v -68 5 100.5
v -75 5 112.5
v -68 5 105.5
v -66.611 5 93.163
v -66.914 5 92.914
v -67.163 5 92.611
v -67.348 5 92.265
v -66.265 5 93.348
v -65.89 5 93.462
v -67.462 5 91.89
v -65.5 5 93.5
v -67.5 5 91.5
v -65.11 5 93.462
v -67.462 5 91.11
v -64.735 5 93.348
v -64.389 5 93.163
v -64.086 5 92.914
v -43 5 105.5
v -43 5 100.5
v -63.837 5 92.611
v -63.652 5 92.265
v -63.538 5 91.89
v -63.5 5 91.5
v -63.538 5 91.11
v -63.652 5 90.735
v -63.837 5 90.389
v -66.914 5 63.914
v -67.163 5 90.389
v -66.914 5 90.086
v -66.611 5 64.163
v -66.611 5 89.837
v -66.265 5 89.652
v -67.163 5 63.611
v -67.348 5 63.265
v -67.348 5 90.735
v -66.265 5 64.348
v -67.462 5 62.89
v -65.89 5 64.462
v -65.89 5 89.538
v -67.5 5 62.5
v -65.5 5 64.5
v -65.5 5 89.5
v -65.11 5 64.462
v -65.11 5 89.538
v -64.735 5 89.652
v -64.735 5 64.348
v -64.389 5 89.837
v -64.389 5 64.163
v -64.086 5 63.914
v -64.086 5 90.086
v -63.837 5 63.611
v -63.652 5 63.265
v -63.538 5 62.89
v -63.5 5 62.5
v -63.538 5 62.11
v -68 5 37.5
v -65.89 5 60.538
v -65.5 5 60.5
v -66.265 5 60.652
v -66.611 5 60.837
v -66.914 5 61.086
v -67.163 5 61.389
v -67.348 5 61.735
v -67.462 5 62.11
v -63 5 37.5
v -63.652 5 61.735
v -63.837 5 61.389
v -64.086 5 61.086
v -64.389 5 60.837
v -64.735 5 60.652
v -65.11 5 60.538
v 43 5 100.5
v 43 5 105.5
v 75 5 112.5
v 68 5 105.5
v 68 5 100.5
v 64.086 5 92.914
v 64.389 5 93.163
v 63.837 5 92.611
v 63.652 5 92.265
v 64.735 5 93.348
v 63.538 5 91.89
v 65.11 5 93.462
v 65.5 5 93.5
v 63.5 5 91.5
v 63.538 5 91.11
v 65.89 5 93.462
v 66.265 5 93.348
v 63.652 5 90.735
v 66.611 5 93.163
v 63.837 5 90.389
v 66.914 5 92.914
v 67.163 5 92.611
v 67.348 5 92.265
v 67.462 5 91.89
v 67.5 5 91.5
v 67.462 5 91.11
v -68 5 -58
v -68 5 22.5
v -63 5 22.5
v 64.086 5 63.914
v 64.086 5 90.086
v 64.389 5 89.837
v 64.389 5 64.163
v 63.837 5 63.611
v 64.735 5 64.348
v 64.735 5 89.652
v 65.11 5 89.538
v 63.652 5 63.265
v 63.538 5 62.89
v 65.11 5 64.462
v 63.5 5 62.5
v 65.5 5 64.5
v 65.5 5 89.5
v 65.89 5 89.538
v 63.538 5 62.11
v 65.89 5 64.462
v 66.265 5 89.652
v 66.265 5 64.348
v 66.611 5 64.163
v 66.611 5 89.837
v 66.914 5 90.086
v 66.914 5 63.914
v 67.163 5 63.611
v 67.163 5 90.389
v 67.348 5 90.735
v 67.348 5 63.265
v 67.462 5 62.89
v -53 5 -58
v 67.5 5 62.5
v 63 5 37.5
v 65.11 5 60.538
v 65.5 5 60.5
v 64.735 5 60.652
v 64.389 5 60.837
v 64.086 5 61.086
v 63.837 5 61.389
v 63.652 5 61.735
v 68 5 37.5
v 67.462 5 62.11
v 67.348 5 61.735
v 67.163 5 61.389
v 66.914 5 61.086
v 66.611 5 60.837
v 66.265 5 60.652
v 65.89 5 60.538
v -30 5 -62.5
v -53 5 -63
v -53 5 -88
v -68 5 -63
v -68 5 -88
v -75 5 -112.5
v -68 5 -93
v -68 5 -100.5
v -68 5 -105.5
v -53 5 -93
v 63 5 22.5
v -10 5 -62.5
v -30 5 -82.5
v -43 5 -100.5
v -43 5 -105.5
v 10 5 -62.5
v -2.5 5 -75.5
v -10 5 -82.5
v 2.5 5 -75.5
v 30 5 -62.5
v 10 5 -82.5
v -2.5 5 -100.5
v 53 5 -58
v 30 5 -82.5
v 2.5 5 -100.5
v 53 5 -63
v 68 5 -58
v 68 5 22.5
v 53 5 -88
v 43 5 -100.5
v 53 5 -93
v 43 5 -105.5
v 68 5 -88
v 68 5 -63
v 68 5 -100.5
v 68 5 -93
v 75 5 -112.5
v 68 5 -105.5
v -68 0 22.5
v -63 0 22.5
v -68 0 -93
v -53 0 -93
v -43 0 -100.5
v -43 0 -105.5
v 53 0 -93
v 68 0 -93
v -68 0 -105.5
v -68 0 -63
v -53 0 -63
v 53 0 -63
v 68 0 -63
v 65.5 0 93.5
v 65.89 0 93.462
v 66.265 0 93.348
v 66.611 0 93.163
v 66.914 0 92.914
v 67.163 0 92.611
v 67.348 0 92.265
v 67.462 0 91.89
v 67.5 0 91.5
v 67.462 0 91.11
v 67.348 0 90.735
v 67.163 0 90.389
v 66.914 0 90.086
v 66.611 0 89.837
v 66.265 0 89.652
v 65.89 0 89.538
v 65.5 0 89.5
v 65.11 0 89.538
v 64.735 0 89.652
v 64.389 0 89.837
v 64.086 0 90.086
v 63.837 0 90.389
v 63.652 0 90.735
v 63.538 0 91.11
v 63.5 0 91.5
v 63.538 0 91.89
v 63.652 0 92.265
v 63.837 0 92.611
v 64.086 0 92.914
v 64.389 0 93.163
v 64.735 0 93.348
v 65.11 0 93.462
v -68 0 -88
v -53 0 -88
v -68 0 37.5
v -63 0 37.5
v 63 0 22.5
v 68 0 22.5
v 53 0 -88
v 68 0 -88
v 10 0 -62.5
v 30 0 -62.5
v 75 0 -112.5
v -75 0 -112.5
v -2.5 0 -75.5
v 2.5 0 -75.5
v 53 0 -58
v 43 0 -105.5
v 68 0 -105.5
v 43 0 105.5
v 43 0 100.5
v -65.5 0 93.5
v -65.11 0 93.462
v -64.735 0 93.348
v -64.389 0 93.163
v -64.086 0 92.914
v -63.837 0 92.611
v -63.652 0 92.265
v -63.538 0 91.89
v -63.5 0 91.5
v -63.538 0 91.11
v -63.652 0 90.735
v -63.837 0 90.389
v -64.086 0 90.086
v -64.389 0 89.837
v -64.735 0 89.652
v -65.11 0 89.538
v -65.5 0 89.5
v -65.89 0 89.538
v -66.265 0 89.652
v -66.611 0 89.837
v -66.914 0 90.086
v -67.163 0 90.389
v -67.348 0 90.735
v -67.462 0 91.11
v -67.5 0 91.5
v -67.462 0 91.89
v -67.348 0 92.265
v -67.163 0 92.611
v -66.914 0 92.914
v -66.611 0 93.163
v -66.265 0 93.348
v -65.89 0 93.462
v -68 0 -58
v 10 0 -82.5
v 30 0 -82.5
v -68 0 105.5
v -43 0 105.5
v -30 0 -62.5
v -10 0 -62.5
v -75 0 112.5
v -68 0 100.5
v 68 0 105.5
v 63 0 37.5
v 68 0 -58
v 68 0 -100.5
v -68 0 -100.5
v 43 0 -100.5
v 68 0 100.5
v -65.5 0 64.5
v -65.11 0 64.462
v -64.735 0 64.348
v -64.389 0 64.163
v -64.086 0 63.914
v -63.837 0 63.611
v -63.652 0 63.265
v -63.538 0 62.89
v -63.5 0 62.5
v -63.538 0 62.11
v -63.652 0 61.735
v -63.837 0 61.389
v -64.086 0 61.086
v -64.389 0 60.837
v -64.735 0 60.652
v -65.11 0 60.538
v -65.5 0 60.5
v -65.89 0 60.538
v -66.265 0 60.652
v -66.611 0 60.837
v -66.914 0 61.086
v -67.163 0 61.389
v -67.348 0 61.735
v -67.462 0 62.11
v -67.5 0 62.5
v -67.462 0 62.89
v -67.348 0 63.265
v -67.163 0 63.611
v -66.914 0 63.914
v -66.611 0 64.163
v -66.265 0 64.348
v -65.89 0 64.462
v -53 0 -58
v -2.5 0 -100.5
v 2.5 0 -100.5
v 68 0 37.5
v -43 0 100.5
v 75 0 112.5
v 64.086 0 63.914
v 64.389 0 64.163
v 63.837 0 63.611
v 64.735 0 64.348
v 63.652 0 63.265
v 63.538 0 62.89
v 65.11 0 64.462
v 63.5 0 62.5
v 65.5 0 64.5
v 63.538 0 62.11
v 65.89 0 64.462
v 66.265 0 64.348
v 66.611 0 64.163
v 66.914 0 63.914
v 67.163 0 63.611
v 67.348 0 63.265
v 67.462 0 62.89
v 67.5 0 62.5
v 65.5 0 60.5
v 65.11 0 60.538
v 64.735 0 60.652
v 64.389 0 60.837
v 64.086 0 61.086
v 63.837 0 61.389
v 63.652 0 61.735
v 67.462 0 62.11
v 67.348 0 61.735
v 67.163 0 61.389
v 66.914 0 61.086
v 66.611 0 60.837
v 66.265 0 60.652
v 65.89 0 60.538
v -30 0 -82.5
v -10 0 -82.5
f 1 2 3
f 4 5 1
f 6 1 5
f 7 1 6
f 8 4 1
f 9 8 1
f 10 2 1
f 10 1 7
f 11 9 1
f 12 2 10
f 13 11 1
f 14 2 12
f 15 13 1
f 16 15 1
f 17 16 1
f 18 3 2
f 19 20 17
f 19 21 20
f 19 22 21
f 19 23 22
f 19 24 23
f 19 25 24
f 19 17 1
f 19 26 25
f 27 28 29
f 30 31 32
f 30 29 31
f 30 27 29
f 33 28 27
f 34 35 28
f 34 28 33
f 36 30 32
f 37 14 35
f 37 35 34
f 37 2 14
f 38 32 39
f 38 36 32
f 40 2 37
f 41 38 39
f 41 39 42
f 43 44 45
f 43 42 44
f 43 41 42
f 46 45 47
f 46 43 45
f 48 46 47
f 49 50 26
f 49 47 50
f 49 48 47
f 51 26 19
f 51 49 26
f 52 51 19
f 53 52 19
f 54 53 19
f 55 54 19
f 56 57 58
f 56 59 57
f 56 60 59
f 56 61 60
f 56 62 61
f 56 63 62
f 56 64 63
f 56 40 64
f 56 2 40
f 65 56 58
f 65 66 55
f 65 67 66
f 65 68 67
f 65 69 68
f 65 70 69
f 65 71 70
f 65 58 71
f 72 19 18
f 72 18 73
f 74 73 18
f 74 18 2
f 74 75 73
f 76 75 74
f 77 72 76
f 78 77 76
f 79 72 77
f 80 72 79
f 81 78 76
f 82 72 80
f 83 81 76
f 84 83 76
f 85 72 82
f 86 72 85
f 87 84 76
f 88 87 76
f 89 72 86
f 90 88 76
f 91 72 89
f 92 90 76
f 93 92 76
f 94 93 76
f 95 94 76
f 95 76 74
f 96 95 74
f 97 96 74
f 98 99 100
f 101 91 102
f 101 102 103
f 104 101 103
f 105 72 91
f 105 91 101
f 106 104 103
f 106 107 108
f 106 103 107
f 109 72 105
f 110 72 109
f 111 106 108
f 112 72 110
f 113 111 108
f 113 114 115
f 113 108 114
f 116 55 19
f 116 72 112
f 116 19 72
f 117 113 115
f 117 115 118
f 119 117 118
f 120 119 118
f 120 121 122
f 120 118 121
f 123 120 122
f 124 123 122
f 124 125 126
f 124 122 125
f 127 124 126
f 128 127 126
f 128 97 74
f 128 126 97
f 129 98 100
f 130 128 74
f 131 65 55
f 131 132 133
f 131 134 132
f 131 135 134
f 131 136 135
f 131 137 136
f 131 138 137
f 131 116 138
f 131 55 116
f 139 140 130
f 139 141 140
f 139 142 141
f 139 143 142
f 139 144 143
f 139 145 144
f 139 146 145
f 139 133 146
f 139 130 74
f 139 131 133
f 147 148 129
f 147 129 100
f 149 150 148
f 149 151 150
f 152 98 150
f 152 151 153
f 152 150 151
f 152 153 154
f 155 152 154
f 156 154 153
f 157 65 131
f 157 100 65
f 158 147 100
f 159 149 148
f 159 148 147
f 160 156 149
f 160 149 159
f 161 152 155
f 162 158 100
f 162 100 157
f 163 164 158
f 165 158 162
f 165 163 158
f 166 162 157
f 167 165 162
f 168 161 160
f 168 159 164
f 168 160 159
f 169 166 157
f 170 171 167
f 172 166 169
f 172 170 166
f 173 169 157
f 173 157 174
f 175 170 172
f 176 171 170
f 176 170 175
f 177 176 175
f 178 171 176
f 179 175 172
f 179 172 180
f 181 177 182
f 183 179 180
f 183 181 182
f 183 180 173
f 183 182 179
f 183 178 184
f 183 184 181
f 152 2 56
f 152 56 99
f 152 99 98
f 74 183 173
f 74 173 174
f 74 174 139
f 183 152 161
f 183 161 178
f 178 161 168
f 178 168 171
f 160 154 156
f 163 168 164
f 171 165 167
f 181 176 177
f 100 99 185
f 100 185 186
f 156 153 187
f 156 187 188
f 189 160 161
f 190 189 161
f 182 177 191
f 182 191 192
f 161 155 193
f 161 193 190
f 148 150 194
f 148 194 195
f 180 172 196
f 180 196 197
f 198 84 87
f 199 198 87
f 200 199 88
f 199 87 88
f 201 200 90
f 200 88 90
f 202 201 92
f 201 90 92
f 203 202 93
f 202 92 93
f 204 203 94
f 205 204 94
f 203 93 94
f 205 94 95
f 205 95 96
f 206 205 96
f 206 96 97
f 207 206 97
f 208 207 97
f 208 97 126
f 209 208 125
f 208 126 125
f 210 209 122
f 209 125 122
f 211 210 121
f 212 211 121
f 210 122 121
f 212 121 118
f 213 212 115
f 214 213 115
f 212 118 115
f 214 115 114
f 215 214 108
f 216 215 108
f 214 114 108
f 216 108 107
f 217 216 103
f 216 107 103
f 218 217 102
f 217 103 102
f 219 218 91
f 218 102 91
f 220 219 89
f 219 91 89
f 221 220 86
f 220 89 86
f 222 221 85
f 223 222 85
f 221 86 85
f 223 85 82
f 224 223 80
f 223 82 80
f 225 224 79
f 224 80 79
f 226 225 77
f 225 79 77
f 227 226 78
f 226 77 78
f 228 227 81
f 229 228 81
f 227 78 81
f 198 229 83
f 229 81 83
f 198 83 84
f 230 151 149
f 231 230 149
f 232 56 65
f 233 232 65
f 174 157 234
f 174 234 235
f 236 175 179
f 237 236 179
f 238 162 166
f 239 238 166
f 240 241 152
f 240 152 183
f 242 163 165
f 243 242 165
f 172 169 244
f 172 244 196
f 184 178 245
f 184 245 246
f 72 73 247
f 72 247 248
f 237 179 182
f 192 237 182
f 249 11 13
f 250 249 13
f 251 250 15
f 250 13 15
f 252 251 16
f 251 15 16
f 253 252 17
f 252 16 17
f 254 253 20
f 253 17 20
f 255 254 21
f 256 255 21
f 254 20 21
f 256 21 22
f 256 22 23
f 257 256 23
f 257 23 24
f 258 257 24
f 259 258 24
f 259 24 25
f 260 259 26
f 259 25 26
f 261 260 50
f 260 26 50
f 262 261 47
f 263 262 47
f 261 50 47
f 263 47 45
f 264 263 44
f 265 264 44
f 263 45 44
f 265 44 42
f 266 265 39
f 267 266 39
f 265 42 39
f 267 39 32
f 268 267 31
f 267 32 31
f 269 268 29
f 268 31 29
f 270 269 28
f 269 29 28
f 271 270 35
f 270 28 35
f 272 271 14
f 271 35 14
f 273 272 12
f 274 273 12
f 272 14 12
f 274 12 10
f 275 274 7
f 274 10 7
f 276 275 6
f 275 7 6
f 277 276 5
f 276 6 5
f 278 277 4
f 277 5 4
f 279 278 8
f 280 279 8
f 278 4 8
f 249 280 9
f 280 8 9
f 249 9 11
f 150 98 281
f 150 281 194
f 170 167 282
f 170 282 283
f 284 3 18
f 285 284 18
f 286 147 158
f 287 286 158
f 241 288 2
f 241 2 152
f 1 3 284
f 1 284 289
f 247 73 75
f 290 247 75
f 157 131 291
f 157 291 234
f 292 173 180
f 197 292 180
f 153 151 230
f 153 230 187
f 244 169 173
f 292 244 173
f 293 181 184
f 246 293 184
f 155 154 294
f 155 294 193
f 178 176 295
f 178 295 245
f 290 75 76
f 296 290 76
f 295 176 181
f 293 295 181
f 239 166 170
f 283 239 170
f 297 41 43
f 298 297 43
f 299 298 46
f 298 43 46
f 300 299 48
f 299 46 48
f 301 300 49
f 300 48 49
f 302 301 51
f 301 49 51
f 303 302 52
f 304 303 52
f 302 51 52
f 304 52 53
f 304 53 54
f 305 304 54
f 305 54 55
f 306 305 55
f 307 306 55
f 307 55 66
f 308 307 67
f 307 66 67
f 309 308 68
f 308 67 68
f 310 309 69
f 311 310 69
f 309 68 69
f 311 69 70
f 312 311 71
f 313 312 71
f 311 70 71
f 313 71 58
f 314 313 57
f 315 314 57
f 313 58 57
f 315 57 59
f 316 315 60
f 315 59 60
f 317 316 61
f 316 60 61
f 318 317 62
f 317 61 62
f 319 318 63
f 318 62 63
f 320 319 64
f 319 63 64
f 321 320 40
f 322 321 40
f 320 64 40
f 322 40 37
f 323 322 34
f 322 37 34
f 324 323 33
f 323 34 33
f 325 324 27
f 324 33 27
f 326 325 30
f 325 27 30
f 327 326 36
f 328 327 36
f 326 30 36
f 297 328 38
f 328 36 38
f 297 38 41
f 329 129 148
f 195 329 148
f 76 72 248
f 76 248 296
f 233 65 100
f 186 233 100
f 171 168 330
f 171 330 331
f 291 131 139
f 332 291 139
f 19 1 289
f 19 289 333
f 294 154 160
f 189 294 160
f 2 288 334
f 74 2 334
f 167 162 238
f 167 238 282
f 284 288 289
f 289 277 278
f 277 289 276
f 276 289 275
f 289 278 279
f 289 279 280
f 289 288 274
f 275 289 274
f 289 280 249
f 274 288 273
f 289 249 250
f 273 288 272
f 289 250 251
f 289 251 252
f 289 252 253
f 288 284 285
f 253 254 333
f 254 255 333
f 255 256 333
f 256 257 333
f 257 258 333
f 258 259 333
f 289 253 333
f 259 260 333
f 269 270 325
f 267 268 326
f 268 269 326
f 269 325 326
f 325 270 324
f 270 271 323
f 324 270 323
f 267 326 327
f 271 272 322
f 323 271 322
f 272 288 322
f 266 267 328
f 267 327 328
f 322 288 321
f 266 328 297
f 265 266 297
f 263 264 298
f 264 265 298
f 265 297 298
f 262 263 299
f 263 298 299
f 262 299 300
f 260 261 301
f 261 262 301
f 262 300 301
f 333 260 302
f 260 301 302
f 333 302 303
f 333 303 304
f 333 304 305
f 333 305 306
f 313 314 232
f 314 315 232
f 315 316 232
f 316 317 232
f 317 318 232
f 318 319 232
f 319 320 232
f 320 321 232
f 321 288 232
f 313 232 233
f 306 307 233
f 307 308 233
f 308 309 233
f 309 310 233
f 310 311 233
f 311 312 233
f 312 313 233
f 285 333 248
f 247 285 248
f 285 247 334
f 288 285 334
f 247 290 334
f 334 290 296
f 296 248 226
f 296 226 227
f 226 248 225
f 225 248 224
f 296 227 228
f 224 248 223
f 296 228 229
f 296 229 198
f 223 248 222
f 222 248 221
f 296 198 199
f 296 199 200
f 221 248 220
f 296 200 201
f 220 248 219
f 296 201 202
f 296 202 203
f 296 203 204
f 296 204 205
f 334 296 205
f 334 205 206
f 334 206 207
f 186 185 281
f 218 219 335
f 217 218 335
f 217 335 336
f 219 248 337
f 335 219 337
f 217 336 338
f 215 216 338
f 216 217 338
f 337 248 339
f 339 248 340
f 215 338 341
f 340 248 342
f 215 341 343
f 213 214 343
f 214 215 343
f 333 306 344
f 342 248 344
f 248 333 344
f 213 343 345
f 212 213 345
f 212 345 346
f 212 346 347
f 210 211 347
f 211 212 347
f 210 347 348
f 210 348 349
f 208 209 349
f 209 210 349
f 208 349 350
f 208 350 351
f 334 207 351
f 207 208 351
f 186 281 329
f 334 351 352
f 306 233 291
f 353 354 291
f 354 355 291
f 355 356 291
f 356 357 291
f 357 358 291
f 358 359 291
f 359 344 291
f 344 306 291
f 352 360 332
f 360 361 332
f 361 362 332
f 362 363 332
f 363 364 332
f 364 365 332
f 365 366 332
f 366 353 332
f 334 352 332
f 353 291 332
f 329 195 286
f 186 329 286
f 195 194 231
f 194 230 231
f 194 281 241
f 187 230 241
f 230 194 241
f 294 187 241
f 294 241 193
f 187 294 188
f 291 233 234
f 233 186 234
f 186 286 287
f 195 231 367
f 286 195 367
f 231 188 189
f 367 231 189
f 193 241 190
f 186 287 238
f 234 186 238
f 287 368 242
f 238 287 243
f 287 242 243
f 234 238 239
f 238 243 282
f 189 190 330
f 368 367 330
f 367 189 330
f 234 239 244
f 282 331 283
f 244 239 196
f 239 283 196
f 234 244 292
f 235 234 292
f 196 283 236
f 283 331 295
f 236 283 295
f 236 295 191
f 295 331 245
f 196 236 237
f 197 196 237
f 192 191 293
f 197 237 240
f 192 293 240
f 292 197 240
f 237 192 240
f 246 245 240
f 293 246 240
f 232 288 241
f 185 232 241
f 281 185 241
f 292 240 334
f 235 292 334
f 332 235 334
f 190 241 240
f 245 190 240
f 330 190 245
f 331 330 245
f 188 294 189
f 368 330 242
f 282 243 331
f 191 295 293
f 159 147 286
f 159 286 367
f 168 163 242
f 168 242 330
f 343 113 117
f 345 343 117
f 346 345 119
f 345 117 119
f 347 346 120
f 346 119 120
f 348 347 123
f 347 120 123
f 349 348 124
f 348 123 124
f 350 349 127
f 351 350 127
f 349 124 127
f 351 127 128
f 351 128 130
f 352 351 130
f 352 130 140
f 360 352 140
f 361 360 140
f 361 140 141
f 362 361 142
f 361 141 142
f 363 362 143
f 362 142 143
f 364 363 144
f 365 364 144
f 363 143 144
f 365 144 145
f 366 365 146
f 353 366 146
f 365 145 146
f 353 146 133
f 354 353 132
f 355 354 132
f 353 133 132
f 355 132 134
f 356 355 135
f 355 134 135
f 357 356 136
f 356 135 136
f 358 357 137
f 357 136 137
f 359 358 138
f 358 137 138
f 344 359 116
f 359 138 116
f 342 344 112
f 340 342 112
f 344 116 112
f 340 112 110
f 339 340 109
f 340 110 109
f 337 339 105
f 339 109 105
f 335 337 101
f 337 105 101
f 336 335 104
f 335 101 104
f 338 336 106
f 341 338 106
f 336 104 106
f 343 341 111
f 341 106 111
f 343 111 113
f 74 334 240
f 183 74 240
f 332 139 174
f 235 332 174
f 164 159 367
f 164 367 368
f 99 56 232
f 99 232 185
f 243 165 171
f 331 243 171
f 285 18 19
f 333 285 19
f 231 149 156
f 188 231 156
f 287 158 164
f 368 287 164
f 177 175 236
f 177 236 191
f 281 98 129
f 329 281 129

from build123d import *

# Parameters (mm, degrees)
SKETCH1_W           = 150
SKETCH1_H           = 225
BOSS_EXTRUDE1_DEPTH = 5
SKETCH10_W          = 25
SKETCH10_H          = 5
CUT_EXTRUDE5_DEPTH  = 5
SKETCH11_W          = 15
SKETCH11_H          = 5
CUT_EXTRUDE6_DEPTH  = 5
SKETCH12_W          = 5
SKETCH12_H          = 15
CUT_EXTRUDE7_DEPTH  = 5
SKETCH13_R          = 2
CUT_EXTRUDE8_DEPTH  = 5
SKETCH14_W          = 20
SKETCH14_H          = 20
CUT_EXTRUDE9_DEPTH  = 5
SKETCH15_W          = 5
SKETCH15_H          = 25
CUT_EXTRUDE10_DEPTH = 5


with BuildPart() as part:
    # Sketch1 → Boss-Extrude1 (new body)
    with BuildSketch(Plane(origin=(0, 0, 0), x_dir=(1, 0, 0), z_dir=(0, 1, 0))):
        Rectangle(SKETCH1_W, SKETCH1_H)
    extrude(amount=BOSS_EXTRUDE1_DEPTH)

    # Sketch10 → Cut-Extrude5 (cut)
    with BuildSketch(Plane(origin=(0, 5, 0), x_dir=(1, 0, 0), z_dir=(0, 1, 0))):
        with Locations((-55.5, -103)):
            Rectangle(SKETCH10_W, SKETCH10_H)
        with Locations((-55.5, 103)):
            Rectangle(SKETCH10_W, SKETCH10_H)
        with Locations((55.5, -103)):
            Rectangle(SKETCH10_W, SKETCH10_H)
        with Locations((55.5, 103)):
            Rectangle(SKETCH10_W, SKETCH10_H)
    extrude(amount=-CUT_EXTRUDE5_DEPTH, mode=Mode.SUBTRACT)

    # Sketch11 → Cut-Extrude6 (cut)
    with BuildSketch(Plane(origin=(0, 5, 0), x_dir=(1, 0, 0), z_dir=(0, 1, 0))):
        with Locations((-60.5, 90.5)):
            Rectangle(SKETCH11_W, SKETCH11_H)
        with Locations((60.5, 90.5)):
            Rectangle(SKETCH11_W, SKETCH11_H)
        with Locations((-60.5, 60.5)):
            Rectangle(SKETCH11_W, SKETCH11_H)
        with Locations((60.5, 60.5)):
            Rectangle(SKETCH11_W, SKETCH11_H)
    extrude(amount=-CUT_EXTRUDE6_DEPTH, mode=Mode.SUBTRACT)

    # Sketch12 → Cut-Extrude7 (cut)
    with BuildSketch(Plane(origin=(0, 5, 0), x_dir=(1, 0, 0), z_dir=(0, 1, 0))):
        with Locations((-65.5, -30)):
            Rectangle(SKETCH12_W, SKETCH12_H)
        with Locations((65.5, -30)):
            Rectangle(SKETCH12_W, SKETCH12_H)
    extrude(amount=-CUT_EXTRUDE7_DEPTH, mode=Mode.SUBTRACT)

    # Sketch13 → Cut-Extrude8 (cut)
    with BuildSketch(Plane(origin=(0, 5, 0), x_dir=(1, 0, 0), z_dir=(0, 1, 0))):
        with Locations(Location((-65.5, -62.5, 0), (0, 0, 270))):
            Circle(SKETCH13_R)
        with Locations(Location((-65.5, -91.5, 0), (0, 0, 270))):
            Circle(SKETCH13_R)
        with Locations(Location((65.5, -91.5, 0), (0, 0, 270))):
            Circle(SKETCH13_R)
        with Locations(Location((65.5, -62.5, 0), (0, 0, 270))):
            Circle(SKETCH13_R)
    extrude(amount=-CUT_EXTRUDE8_DEPTH, mode=Mode.SUBTRACT)

    # Sketch14 → Cut-Extrude9 (cut)
    with BuildSketch(Plane(origin=(0, 5, 0), x_dir=(1, 0, 0), z_dir=(0, 1, 0))):
        with Locations((20, 72.5)):
            Rectangle(SKETCH14_W, SKETCH14_H)
        with Locations((-20, 72.5)):
            Rectangle(SKETCH14_W, SKETCH14_H)
    extrude(amount=-CUT_EXTRUDE9_DEPTH, mode=Mode.SUBTRACT)

    # Sketch15 → Cut-Extrude10 (cut)
    with BuildSketch(Plane(origin=(0, 5, 0), x_dir=(1, 0, 0), z_dir=(0, 1, 0))):
        with Locations((0, 88)):
            Rectangle(SKETCH15_W, SKETCH15_H)
    extrude(amount=-CUT_EXTRUDE10_DEPTH, mode=Mode.SUBTRACT)


solid = part.part
